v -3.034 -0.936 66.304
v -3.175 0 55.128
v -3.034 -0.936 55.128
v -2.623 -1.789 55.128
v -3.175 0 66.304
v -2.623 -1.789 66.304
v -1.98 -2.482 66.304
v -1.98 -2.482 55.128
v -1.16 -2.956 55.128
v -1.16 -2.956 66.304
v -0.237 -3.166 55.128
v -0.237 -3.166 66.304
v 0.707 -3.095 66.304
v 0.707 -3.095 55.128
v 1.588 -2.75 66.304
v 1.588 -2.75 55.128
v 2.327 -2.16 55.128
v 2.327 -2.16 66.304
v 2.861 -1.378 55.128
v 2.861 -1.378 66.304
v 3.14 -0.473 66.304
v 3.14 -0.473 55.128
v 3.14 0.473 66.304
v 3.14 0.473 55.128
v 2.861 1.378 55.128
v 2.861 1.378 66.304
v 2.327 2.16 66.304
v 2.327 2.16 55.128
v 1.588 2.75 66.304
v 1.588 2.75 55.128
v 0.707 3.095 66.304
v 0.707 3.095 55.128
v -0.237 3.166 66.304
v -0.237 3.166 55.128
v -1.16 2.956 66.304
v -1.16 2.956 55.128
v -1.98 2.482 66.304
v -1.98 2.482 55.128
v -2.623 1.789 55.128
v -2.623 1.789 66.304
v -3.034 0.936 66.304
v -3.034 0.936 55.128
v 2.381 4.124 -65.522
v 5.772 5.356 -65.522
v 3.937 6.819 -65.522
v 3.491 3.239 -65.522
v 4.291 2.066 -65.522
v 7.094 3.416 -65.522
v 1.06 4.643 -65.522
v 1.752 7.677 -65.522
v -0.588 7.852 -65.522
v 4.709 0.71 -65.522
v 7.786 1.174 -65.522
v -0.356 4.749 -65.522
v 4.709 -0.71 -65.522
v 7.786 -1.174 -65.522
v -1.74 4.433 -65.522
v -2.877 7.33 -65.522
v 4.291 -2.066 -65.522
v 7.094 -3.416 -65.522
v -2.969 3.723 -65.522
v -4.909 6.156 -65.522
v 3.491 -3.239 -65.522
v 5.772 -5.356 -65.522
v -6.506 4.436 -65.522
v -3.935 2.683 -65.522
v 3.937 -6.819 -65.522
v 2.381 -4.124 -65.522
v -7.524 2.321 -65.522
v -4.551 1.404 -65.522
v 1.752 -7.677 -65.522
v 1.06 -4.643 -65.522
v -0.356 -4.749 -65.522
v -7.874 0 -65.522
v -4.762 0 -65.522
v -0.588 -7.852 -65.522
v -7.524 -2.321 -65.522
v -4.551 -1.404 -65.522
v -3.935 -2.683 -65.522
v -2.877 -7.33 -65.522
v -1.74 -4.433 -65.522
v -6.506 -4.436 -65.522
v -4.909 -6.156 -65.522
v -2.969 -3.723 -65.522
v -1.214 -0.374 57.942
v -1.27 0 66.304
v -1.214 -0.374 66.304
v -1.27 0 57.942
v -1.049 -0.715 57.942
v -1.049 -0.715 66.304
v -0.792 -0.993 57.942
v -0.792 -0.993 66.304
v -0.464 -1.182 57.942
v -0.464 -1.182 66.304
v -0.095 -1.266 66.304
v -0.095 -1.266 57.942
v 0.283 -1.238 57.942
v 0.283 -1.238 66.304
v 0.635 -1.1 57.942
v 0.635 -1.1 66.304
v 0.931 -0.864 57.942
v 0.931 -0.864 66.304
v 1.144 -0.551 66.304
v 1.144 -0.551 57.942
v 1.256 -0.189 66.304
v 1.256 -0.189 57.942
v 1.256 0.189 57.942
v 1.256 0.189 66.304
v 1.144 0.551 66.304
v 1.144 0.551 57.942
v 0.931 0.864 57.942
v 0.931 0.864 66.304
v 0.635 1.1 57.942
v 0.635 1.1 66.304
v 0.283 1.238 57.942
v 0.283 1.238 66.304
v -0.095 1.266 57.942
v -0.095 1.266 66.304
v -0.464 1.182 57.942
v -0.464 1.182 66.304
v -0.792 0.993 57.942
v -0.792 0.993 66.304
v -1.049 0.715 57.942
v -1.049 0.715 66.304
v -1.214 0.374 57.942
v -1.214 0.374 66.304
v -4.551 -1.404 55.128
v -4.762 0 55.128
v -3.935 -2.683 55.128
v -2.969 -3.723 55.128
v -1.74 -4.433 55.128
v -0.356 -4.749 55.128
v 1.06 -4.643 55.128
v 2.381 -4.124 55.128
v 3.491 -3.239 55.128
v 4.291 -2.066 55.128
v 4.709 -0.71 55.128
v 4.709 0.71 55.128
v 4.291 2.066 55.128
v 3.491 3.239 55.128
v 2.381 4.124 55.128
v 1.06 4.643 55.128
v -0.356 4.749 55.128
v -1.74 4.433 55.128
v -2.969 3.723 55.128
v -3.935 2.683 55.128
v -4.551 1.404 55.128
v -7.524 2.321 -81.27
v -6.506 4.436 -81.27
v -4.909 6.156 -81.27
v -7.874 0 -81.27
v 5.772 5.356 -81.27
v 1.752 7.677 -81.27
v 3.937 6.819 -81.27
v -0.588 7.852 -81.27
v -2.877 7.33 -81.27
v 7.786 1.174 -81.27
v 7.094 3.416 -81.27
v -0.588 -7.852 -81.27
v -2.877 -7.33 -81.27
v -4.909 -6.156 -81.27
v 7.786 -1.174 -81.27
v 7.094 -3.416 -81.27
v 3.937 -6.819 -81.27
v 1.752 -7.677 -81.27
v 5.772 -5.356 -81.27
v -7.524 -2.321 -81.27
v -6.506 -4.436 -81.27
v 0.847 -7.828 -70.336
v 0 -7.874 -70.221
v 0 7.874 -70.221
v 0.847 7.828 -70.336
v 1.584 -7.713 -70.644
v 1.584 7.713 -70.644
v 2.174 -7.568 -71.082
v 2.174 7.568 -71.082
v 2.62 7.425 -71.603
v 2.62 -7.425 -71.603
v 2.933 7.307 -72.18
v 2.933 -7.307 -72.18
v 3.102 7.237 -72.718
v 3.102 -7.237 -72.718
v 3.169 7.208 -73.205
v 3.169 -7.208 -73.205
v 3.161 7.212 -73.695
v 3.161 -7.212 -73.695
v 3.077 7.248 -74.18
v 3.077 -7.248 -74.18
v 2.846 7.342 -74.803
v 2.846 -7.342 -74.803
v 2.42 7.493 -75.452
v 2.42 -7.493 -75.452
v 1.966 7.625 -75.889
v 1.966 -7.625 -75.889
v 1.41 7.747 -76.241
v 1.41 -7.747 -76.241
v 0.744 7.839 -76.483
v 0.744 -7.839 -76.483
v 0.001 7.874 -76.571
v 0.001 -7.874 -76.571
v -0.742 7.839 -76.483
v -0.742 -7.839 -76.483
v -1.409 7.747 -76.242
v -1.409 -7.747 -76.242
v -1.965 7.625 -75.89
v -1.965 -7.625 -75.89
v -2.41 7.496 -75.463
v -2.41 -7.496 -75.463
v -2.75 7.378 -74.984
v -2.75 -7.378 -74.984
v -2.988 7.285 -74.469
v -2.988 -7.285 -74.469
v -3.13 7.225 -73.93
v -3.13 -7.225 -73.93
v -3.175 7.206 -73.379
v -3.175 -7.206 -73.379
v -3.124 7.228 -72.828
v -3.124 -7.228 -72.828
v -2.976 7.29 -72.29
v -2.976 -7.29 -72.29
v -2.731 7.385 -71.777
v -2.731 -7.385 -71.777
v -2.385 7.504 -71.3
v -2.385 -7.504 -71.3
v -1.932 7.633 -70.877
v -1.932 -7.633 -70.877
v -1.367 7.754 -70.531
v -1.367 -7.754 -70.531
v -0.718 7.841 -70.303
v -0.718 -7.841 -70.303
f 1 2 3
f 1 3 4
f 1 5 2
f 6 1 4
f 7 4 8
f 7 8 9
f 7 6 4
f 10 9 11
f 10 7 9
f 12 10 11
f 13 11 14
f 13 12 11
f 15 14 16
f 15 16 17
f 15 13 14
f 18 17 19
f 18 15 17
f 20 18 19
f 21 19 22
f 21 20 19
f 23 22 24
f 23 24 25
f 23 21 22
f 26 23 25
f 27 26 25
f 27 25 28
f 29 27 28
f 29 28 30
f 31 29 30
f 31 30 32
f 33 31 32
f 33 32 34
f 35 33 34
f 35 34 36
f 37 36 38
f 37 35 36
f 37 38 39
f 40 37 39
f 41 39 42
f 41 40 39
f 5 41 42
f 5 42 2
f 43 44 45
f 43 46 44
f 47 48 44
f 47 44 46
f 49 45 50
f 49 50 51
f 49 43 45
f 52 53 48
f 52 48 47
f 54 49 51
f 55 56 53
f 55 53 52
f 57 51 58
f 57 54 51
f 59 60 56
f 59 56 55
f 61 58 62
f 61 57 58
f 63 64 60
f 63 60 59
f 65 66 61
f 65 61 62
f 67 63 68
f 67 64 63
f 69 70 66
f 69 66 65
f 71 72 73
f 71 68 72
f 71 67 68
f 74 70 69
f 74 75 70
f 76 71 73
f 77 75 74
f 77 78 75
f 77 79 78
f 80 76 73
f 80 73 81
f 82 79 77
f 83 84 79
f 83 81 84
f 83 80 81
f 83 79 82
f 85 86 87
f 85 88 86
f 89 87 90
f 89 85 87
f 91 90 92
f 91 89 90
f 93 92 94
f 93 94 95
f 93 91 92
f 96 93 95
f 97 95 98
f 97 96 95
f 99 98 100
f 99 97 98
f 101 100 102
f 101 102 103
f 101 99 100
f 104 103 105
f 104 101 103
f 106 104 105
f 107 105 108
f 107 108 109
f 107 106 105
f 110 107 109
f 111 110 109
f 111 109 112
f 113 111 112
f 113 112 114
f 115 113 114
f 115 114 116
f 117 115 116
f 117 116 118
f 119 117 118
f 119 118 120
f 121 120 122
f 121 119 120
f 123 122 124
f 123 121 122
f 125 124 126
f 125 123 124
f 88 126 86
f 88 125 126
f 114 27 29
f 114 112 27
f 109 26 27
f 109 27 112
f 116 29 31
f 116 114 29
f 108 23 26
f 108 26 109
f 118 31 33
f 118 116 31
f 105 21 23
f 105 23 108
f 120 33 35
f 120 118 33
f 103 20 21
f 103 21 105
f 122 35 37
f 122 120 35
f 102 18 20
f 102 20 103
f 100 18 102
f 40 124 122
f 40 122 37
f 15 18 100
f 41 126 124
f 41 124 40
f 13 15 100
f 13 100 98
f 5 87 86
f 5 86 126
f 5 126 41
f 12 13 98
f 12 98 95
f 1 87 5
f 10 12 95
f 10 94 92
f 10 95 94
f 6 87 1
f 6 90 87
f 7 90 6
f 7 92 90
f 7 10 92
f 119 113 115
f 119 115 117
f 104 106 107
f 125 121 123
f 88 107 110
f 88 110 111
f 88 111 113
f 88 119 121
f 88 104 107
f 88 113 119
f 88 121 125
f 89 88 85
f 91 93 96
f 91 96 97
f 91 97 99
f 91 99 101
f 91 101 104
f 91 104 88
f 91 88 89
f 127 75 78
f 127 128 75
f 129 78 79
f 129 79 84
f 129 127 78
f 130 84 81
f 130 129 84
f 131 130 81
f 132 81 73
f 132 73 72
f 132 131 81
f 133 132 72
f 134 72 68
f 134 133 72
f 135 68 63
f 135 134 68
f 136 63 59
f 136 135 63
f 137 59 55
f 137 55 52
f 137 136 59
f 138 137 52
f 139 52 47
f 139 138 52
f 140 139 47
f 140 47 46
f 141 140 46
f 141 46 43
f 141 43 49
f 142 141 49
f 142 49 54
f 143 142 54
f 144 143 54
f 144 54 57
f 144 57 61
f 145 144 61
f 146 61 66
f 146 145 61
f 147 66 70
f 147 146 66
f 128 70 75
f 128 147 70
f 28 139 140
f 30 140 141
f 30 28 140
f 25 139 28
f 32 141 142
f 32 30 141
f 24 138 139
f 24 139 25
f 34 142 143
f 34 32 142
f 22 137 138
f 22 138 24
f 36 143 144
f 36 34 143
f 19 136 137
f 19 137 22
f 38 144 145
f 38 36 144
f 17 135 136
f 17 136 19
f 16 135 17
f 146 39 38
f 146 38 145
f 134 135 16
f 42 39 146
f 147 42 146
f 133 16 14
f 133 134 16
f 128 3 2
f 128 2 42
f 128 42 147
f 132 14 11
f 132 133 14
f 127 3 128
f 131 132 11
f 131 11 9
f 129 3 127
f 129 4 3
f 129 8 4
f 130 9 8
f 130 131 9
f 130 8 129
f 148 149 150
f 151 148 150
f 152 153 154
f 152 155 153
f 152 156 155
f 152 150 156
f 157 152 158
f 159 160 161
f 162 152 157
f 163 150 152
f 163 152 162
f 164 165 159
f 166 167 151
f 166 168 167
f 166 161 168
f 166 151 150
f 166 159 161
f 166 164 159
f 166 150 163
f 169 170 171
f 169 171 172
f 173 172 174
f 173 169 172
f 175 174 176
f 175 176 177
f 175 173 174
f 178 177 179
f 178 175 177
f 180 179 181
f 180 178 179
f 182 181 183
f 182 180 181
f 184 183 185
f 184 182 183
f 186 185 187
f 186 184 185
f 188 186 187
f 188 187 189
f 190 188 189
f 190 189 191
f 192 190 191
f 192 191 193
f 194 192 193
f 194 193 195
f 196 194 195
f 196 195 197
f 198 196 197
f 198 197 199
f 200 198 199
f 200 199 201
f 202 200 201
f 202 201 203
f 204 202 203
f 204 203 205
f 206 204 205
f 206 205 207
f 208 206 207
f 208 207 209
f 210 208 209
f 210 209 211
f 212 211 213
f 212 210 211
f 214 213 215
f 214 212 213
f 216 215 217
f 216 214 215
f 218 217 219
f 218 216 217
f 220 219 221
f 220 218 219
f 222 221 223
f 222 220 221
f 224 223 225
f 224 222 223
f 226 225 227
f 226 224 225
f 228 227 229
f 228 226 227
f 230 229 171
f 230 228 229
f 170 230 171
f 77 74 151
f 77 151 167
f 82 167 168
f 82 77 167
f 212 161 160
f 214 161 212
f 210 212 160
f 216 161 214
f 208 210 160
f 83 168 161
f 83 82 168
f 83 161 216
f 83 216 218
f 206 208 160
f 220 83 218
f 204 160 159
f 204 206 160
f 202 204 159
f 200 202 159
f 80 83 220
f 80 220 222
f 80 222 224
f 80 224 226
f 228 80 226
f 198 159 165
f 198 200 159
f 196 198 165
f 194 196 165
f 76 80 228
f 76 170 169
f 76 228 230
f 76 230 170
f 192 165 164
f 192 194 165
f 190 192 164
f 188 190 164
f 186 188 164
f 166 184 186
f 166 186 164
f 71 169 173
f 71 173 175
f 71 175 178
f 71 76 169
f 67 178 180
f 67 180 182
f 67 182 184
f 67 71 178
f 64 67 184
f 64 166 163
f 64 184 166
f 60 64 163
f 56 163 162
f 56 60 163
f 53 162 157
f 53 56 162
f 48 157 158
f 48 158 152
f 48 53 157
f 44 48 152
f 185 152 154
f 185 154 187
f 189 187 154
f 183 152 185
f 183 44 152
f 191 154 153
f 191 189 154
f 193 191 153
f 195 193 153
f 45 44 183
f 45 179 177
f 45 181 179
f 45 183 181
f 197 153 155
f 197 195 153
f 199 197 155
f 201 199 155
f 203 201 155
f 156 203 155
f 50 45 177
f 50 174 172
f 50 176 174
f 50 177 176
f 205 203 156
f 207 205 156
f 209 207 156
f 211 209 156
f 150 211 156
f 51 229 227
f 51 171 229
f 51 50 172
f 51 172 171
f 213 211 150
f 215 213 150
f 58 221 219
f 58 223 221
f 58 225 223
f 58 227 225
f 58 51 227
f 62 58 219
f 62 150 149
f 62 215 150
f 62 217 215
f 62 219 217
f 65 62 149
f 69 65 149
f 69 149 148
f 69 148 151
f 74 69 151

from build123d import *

# Parameters (mm, degrees)
CUT_EXTRUDE1_DEPTH      = 83.029585714
CUT_EXTRUDE1_DEPTH_BACK = 83.029585714
SKETCH2_R               = 3.175


with BuildPart() as part:
    # Sketch1 → Revolve1 (revolve)
    with BuildSketch(Plane(origin=(0, 0, 0), x_dir=(1, 0, 0), z_dir=(0, 1, 0))):
        Polygon((0, 81.270247818), (-7.874, 81.270247818), (-7.874, 65.522247818), (-4.7625, 65.522247818), (-4.7625, -55.127752182), (-3.175, -55.127752182), (-3.175, -66.303752182), (-1.27, -66.303752182), (-1.27, -57.942062416), (0, -57.942062416), align=None)
    revolve(axis=Axis((0, 0, -59.310994764), (0, 0, 1)))

    # Sketch2 → Cut-Extrude1 (cut, two sides: drawn at the far end of the back side and taken through both)
    with BuildSketch(Plane(origin=(0, 0, 0), x_dir=(1, 0, 0), z_dir=(0, 1, 0)).offset(-CUT_EXTRUDE1_DEPTH_BACK)):
        with Locations(Location((0, 73.396247818, 0), (0, 0, 270))):
            Circle(SKETCH2_R)
    extrude(amount=CUT_EXTRUDE1_DEPTH + CUT_EXTRUDE1_DEPTH_BACK, mode=Mode.SUBTRACT)


solid = part.part
